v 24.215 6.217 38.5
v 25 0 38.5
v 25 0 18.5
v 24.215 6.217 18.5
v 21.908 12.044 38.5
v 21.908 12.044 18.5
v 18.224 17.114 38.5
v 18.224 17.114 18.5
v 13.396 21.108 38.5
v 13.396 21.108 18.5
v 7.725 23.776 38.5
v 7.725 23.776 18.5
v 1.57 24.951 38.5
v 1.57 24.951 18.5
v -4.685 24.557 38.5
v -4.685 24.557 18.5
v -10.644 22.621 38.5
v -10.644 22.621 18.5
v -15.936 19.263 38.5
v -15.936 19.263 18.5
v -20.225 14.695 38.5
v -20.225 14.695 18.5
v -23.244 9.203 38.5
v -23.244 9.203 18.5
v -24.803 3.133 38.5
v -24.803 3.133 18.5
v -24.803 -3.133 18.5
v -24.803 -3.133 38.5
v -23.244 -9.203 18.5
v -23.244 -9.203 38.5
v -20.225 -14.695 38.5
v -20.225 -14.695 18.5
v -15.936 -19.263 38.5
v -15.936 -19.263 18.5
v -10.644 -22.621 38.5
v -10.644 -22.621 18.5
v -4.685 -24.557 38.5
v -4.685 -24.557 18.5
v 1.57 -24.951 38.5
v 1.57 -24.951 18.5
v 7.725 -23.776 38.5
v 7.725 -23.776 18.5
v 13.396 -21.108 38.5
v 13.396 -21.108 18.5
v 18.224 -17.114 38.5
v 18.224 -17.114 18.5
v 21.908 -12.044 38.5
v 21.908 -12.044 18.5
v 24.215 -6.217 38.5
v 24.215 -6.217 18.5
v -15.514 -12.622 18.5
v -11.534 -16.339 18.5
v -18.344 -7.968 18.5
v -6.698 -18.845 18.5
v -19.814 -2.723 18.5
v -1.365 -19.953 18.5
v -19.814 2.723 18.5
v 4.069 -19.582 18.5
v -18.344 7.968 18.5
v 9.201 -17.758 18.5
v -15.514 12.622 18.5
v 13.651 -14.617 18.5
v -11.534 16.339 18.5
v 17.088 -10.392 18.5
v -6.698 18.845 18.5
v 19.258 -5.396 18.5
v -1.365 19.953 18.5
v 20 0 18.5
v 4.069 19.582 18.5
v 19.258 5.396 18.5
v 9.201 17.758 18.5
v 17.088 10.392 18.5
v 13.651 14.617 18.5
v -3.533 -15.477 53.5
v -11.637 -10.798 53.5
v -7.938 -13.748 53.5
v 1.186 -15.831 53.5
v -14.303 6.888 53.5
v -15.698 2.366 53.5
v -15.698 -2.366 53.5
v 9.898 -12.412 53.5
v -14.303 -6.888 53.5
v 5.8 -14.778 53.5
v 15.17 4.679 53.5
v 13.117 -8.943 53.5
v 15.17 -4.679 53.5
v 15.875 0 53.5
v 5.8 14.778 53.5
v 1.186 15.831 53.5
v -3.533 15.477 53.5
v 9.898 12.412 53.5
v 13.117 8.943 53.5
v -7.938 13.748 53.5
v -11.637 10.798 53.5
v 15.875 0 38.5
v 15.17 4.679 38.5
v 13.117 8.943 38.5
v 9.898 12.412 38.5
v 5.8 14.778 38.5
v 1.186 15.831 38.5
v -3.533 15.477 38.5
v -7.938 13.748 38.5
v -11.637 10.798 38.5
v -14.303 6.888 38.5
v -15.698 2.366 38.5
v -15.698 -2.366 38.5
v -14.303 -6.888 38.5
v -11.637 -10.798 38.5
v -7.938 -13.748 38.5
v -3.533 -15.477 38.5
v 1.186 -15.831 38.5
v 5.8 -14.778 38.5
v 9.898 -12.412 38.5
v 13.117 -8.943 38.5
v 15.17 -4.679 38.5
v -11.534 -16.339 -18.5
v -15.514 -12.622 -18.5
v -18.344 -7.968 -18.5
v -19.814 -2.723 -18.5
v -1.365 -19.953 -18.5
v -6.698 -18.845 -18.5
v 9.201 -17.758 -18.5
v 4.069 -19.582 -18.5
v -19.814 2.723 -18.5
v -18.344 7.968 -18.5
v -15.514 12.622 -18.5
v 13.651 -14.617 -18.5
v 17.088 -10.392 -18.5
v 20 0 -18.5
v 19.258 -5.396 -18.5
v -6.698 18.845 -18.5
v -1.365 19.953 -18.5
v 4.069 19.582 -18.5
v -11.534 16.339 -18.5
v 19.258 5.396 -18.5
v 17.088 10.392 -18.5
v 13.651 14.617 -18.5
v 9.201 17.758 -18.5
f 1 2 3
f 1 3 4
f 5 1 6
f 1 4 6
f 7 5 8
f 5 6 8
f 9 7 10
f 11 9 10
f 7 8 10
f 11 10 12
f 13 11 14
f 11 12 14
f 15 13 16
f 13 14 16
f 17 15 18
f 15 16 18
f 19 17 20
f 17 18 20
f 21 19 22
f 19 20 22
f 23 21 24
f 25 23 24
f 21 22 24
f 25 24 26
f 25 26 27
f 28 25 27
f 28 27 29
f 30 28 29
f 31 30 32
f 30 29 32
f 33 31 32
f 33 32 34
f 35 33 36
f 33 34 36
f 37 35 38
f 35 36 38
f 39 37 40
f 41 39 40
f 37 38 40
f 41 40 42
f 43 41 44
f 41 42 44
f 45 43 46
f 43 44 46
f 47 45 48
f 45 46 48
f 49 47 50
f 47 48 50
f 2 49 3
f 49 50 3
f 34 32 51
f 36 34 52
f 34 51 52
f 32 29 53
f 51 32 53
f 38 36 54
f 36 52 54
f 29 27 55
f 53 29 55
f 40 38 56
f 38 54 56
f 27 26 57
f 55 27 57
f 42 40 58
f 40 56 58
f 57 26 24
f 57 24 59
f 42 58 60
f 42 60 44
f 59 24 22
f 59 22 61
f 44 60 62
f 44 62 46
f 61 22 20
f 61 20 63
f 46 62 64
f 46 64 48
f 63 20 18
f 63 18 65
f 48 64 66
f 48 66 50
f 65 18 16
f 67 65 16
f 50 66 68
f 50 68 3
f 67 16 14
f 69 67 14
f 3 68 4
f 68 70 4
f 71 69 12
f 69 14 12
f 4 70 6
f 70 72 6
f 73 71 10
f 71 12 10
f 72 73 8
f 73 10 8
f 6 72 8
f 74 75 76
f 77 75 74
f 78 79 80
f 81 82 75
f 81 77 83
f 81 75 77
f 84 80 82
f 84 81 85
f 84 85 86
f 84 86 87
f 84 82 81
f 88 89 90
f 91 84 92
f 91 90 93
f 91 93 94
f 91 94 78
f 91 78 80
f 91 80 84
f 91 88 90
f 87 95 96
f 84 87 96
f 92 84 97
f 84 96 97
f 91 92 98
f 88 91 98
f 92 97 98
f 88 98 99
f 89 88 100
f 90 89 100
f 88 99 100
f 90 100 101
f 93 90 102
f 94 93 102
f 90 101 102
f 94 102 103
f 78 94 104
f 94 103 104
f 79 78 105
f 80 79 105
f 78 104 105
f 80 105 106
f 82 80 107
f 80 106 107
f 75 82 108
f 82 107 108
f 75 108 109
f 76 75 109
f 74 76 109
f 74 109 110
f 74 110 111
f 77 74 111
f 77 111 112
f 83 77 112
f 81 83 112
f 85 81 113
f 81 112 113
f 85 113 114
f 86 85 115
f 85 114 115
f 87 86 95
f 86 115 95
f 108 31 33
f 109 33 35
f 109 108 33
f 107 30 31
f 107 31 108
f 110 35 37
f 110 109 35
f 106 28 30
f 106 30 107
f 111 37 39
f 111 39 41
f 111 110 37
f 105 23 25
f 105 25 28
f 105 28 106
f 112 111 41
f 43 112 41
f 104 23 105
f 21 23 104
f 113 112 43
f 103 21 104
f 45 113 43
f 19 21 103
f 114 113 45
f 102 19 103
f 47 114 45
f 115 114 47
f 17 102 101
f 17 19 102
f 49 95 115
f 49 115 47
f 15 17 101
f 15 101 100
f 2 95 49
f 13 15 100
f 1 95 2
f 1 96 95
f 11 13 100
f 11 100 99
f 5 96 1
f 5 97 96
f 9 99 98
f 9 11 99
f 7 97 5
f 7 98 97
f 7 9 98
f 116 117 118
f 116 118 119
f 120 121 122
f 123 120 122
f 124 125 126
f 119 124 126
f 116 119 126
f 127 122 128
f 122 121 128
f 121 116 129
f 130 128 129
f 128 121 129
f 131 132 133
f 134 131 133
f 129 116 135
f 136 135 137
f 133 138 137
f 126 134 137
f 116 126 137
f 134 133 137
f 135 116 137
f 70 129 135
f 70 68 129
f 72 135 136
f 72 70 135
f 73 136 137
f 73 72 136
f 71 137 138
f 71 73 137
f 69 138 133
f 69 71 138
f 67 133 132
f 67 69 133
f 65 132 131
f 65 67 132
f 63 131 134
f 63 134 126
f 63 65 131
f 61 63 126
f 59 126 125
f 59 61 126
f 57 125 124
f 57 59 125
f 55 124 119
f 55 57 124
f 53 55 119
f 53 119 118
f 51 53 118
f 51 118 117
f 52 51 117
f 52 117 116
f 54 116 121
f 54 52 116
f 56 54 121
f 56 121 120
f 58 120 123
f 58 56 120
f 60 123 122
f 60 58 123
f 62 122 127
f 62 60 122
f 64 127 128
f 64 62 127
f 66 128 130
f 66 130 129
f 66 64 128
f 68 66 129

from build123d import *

# Parameters (mm, degrees)
CROQUIS1_R              = 20
SALIENTE_EXTRUIR2_DEPTH = 18.5
CROQUIS3_R              = 25
SALIENTE_EXTRUIR3_DEPTH = 20
CROQUIS4_R              = 15.875
SALIENTE_EXTRUIR4_DEPTH = 15


with BuildPart() as part:
    # Croquis1 → Saliente-Extruir2 (new, symmetric)
    with BuildSketch(Plane.XY):
        Circle(CROQUIS1_R)
    extrude(amount=SALIENTE_EXTRUIR2_DEPTH, both=True)

    # Croquis3 → Saliente-Extruir3 (add)
    with BuildSketch(Plane.XY.offset(18.5)):
        Circle(CROQUIS3_R)
    extrude(amount=SALIENTE_EXTRUIR3_DEPTH)

    # Croquis4 → Saliente-Extruir4 (add)
    with BuildSketch(Plane.XY.offset(38.5)):
        Circle(CROQUIS4_R)
    extrude(amount=SALIENTE_EXTRUIR4_DEPTH)


solid = part.part
